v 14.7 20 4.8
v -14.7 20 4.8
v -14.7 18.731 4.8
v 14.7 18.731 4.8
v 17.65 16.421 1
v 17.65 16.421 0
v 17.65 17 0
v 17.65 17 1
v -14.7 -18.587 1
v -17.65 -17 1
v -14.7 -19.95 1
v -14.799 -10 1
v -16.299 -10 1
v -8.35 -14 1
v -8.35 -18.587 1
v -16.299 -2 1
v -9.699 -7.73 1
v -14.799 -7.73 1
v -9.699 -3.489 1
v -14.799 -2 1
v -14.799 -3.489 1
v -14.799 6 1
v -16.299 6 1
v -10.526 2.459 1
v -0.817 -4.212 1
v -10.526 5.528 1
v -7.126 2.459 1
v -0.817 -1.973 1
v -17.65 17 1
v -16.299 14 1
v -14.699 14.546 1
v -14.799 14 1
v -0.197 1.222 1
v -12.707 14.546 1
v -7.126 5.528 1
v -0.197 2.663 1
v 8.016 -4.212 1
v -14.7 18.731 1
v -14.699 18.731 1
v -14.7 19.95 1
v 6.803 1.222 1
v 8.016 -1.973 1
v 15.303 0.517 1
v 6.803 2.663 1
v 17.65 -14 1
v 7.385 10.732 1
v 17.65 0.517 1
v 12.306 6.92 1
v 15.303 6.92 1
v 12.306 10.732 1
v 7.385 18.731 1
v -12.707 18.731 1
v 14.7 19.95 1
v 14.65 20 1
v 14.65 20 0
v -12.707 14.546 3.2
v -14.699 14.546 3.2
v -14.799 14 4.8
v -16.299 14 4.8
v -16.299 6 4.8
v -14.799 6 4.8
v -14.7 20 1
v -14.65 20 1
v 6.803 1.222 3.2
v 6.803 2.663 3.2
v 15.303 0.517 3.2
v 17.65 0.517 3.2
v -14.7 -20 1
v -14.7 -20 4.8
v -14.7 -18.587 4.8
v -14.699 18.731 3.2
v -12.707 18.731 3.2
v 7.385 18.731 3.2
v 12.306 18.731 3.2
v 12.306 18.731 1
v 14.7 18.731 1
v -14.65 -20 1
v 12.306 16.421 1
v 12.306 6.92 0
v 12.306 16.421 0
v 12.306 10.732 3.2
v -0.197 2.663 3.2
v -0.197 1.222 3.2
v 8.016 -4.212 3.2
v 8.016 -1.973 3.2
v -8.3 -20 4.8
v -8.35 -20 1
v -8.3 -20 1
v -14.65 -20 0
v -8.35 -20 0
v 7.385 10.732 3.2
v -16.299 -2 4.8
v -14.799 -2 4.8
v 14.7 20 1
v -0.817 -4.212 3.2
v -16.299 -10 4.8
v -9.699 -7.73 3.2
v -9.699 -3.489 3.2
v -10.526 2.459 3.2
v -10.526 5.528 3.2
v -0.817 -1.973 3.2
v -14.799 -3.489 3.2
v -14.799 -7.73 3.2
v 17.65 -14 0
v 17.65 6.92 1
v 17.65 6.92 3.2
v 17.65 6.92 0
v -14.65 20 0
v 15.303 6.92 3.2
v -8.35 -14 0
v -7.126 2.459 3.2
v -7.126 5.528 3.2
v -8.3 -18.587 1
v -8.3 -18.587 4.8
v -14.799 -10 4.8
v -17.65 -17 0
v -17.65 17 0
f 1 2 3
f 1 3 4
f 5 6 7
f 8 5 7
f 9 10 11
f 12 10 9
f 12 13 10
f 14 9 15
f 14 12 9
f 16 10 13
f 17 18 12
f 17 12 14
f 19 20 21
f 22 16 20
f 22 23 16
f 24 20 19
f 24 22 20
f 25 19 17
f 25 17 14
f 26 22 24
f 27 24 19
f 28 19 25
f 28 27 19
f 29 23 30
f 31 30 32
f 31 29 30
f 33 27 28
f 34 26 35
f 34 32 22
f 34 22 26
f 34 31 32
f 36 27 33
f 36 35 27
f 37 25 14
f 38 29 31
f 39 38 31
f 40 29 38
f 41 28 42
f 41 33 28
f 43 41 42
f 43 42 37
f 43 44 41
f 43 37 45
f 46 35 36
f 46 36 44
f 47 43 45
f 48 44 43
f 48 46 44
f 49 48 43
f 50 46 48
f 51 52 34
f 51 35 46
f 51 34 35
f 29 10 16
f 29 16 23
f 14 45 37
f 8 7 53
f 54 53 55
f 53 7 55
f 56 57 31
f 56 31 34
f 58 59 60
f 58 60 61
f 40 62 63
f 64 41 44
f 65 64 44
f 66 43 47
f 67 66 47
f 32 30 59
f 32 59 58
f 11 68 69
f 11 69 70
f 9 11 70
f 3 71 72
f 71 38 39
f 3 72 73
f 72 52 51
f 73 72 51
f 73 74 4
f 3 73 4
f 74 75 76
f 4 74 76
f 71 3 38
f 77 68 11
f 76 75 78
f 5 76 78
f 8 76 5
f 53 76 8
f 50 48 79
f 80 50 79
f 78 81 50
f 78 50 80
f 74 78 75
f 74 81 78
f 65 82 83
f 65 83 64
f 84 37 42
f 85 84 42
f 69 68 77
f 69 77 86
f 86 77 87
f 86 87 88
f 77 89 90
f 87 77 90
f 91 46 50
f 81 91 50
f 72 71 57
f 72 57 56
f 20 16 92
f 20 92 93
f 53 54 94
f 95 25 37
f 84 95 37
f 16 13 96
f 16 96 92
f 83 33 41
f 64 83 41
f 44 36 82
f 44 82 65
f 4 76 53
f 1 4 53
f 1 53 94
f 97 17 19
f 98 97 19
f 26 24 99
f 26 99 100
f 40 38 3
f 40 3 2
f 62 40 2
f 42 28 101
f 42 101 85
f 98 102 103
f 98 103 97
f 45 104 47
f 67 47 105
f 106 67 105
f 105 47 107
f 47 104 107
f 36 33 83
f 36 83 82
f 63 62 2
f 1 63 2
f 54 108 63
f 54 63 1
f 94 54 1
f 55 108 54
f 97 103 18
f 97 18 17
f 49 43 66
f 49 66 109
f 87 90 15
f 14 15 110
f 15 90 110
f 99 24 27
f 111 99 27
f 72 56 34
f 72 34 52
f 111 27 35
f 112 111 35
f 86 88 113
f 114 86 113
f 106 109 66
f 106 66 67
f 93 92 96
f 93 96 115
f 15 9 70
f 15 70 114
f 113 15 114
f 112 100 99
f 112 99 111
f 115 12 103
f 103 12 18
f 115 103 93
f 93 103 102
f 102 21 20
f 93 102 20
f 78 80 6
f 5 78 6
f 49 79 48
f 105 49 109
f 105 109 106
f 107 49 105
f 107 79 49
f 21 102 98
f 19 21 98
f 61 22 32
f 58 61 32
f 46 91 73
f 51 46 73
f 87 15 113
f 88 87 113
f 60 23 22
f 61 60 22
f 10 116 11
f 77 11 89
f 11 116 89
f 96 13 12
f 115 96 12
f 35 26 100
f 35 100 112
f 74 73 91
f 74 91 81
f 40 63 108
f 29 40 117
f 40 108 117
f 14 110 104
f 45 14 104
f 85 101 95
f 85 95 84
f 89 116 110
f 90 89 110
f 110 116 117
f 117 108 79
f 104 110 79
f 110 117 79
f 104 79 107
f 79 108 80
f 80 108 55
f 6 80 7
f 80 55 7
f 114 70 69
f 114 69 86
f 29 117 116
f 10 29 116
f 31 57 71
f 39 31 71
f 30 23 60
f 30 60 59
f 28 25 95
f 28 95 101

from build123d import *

# Parameters (mm, degrees)
BASE_DEPTH      = 1
SKETCH_2_W      = 5
SKETCH_2_H      = 4.241016002
SKETCH_2_W_2    = 3.399648754
SKETCH_2_H_2    = 3.069015748
SKETCH_2_W_3    = 8.833032766
SKETCH_2_H_3    = 2.239343378
SKETCH_2_W_4    = 7
SKETCH_2_H_4    = 1.440284481
SKETCH_2_W_5    = 2.346977394
SKETCH_2_H_5    = 6.402667005
SKETCH_2_W_6    = 4.921188948
SKETCH_2_H_6    = 7.755318771
SKETCH_2_W_7    = 1.992801626
SKETCH_2_H_7    = 3.770694824
PILLARS_DEPTH   = 2.2
SKETCH_3_W      = 1.5
SKETCH_3_H      = 8
SKETCH_3_W_2    = 29.4
SKETCH_3_H_2    = 1.268554838
SKETCH_3_W_3    = 6.4
SKETCH_3_H_3    = 1.412663195
ENCLOSURE_DEPTH = 3.800051
PADDING_REACH   = 5.2
SKETCH_5_W      = 1.992801626
SKETCH_5_H      = 0.414508298
SKETCH_5_W_2    = 4.921188948
SKETCH_5_H_2    = 0.244108357
SKETCH_5_W_3    = 0.1
SKETCH_5_H_3    = 4.241016002


with BuildPart() as part:
    # 草图1 → Base (new body)
    with BuildSketch(Plane.XY):
        Polygon((14.65, 20), (-14.65, 20), (-17.65, 17), (-17.65, -17), (-14.65, -20), (-8.35, -20), (-8.35, -14), (17.65, -14), (17.65, 6.919667259), (12.305816612, 6.919667259), (12.305816612, 16.420619761), (17.65, 16.420619761), (17.65, 17), align=None)
    extrude(amount=BASE_DEPTH)

    # 草图2 → Pillars (add)
    with BuildSketch(Plane.XY.offset(1)):
        with Locations((-12.199329439, -5.609511049)):
            Rectangle(SKETCH_2_W, SKETCH_2_H)
        with Locations((-8.825830005, 3.993507112)):
            Rectangle(SKETCH_2_W_2, SKETCH_2_H_2)
        with Locations((3.599511049, -3.092672705)):
            Rectangle(SKETCH_2_W_3, SKETCH_2_H_3)
        with Locations((3.303022606, 1.942635256)):
            Rectangle(SKETCH_2_W_4, SKETCH_2_H_4)
        with Locations((16.476511303, 3.718333757)):
            Rectangle(SKETCH_2_W_5, SKETCH_2_H_5)
        with Locations((9.845222138, 14.60967742)):
            Rectangle(SKETCH_2_W_6, SKETCH_2_H_6)
        with Locations((-13.702928626, 16.431589452)):
            Rectangle(SKETCH_2_W_7, SKETCH_2_H_7)
    extrude(amount=PILLARS_DEPTH)

    # 草图3 → Enclosure (add)
    with BuildSketch(Plane.XY.offset(1)):
        with Locations((-15.549329439, 10)):
            Rectangle(SKETCH_3_W, SKETCH_3_H)
        with Locations((0, 19.365722581)):
            Rectangle(SKETCH_3_W_2, SKETCH_3_H_2)
        with Locations((-11.5, -19.293668402)):
            Rectangle(SKETCH_3_W_3, SKETCH_3_H_3)
        with Locations((-15.549329439, -6)):
            Rectangle(SKETCH_3_W, SKETCH_3_H)
    extrude(amount=ENCLOSURE_DEPTH)

    # 草图5 → Padding (add, up to next)
    with BuildSketch(Plane.XY.offset(3.2), mode=Mode.PRIVATE) as padding_sk1:
        with Locations((-13.702928626, 18.524191013)):
            Rectangle(SKETCH_5_W, SKETCH_5_H)
    padding_tool1 = extrude(padding_sk1.sketch, amount=-PADDING_REACH, mode=Mode.PRIVATE) - part.part
    add(padding_tool1.solids().sort_by_distance((-13.702929, 18.524191, 3.2))[0])
    # 草图5 → Padding (add, up to next)
    with BuildSketch(Plane.XY.offset(3.2), mode=Mode.PRIVATE) as padding_sk2:
        with Locations((9.845222138, 18.609390983)):
            Rectangle(SKETCH_5_W_2, SKETCH_5_H_2)
    padding_tool2 = extrude(padding_sk2.sketch, amount=-PADDING_REACH, mode=Mode.PRIVATE) - part.part
    add(padding_tool2.solids().sort_by_distance((9.845222, 18.609391, 3.2))[0])
    # 草图5 → Padding (add, up to next)
    with BuildSketch(Plane.XY.offset(3.2), mode=Mode.PRIVATE) as padding_sk3:
        with Locations((-14.749329439, -5.609511049)):
            Rectangle(SKETCH_5_W_3, SKETCH_5_H_3)
    padding_tool3 = extrude(padding_sk3.sketch, amount=-PADDING_REACH, mode=Mode.PRIVATE) - part.part
    add(padding_tool3.solids().sort_by_distance((-14.749329, -5.609511, 3.2))[0])


solid = part.part
